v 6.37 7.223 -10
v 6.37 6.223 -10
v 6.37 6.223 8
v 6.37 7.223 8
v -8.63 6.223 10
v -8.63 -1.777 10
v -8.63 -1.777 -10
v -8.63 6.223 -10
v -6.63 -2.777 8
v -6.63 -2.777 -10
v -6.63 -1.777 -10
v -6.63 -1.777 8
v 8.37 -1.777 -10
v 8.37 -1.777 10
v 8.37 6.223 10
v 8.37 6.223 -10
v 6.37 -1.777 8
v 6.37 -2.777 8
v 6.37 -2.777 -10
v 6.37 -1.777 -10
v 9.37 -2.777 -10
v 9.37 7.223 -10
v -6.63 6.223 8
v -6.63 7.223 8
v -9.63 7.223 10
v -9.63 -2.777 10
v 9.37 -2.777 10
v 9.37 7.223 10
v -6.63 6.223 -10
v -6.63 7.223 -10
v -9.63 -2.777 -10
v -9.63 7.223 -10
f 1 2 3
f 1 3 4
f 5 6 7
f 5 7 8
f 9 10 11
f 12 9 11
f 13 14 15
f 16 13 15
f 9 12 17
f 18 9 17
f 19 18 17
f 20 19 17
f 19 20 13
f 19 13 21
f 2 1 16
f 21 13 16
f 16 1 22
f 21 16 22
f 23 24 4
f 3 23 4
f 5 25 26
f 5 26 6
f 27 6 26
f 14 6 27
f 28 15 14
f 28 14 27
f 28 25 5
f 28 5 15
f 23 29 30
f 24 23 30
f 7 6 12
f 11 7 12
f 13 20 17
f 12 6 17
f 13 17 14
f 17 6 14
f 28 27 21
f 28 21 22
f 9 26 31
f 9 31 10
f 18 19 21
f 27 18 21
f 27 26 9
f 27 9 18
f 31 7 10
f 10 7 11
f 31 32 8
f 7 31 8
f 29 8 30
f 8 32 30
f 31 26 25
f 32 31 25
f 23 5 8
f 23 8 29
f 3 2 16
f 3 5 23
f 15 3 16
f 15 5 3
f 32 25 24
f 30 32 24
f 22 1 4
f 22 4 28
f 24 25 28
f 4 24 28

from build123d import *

# Parameters (mm, degrees)
BOSS_EXTRUDE1_DEPTH      = 10
BOSS_EXTRUDE1_DEPTH_BACK = 10
SKETCH1_W                = 19
SKETCH1_H                = 10
SKETCH2_W                = 17
SKETCH2_H                = 8
CUT_EXTRUDE1_DEPTH       = 20
CUT_EXTRUDE3_DEPTH       = 8
CUT_EXTRUDE3_DEPTH_BACK  = 10
SKETCH3_W                = 13
SKETCH3_H                = 10.51996768


with BuildPart() as part:
    # Sketch1 → Boss-Extrude1 (new, two sides: drawn at the far end of the back side and taken through both)
    with BuildSketch(Plane.XY.offset(-BOSS_EXTRUDE1_DEPTH_BACK)):
        with Locations((-0.130136986, 2.22260274)):
            Rectangle(SKETCH1_W, SKETCH1_H)
    extrude(amount=BOSS_EXTRUDE1_DEPTH + BOSS_EXTRUDE1_DEPTH_BACK)

    # Sketch2 → Cut-Extrude1 (cut)
    with BuildSketch(Plane.XY.offset(10)):
        with Locations((-0.130136986, 2.22260274)):
            Rectangle(SKETCH2_W, SKETCH2_H)
    extrude(amount=-CUT_EXTRUDE1_DEPTH, mode=Mode.SUBTRACT)

    # Sketch3 → Cut-Extrude3 (cut, two sides: drawn at the far end of the back side and taken through both)
    with BuildSketch(Plane.XY.offset(-CUT_EXTRUDE3_DEPTH_BACK)):
        with Locations((-0.130136986, 2.34516547)):
            Rectangle(SKETCH3_W, SKETCH3_H)
    extrude(amount=CUT_EXTRUDE3_DEPTH + CUT_EXTRUDE3_DEPTH_BACK, mode=Mode.SUBTRACT)


solid = part.part
